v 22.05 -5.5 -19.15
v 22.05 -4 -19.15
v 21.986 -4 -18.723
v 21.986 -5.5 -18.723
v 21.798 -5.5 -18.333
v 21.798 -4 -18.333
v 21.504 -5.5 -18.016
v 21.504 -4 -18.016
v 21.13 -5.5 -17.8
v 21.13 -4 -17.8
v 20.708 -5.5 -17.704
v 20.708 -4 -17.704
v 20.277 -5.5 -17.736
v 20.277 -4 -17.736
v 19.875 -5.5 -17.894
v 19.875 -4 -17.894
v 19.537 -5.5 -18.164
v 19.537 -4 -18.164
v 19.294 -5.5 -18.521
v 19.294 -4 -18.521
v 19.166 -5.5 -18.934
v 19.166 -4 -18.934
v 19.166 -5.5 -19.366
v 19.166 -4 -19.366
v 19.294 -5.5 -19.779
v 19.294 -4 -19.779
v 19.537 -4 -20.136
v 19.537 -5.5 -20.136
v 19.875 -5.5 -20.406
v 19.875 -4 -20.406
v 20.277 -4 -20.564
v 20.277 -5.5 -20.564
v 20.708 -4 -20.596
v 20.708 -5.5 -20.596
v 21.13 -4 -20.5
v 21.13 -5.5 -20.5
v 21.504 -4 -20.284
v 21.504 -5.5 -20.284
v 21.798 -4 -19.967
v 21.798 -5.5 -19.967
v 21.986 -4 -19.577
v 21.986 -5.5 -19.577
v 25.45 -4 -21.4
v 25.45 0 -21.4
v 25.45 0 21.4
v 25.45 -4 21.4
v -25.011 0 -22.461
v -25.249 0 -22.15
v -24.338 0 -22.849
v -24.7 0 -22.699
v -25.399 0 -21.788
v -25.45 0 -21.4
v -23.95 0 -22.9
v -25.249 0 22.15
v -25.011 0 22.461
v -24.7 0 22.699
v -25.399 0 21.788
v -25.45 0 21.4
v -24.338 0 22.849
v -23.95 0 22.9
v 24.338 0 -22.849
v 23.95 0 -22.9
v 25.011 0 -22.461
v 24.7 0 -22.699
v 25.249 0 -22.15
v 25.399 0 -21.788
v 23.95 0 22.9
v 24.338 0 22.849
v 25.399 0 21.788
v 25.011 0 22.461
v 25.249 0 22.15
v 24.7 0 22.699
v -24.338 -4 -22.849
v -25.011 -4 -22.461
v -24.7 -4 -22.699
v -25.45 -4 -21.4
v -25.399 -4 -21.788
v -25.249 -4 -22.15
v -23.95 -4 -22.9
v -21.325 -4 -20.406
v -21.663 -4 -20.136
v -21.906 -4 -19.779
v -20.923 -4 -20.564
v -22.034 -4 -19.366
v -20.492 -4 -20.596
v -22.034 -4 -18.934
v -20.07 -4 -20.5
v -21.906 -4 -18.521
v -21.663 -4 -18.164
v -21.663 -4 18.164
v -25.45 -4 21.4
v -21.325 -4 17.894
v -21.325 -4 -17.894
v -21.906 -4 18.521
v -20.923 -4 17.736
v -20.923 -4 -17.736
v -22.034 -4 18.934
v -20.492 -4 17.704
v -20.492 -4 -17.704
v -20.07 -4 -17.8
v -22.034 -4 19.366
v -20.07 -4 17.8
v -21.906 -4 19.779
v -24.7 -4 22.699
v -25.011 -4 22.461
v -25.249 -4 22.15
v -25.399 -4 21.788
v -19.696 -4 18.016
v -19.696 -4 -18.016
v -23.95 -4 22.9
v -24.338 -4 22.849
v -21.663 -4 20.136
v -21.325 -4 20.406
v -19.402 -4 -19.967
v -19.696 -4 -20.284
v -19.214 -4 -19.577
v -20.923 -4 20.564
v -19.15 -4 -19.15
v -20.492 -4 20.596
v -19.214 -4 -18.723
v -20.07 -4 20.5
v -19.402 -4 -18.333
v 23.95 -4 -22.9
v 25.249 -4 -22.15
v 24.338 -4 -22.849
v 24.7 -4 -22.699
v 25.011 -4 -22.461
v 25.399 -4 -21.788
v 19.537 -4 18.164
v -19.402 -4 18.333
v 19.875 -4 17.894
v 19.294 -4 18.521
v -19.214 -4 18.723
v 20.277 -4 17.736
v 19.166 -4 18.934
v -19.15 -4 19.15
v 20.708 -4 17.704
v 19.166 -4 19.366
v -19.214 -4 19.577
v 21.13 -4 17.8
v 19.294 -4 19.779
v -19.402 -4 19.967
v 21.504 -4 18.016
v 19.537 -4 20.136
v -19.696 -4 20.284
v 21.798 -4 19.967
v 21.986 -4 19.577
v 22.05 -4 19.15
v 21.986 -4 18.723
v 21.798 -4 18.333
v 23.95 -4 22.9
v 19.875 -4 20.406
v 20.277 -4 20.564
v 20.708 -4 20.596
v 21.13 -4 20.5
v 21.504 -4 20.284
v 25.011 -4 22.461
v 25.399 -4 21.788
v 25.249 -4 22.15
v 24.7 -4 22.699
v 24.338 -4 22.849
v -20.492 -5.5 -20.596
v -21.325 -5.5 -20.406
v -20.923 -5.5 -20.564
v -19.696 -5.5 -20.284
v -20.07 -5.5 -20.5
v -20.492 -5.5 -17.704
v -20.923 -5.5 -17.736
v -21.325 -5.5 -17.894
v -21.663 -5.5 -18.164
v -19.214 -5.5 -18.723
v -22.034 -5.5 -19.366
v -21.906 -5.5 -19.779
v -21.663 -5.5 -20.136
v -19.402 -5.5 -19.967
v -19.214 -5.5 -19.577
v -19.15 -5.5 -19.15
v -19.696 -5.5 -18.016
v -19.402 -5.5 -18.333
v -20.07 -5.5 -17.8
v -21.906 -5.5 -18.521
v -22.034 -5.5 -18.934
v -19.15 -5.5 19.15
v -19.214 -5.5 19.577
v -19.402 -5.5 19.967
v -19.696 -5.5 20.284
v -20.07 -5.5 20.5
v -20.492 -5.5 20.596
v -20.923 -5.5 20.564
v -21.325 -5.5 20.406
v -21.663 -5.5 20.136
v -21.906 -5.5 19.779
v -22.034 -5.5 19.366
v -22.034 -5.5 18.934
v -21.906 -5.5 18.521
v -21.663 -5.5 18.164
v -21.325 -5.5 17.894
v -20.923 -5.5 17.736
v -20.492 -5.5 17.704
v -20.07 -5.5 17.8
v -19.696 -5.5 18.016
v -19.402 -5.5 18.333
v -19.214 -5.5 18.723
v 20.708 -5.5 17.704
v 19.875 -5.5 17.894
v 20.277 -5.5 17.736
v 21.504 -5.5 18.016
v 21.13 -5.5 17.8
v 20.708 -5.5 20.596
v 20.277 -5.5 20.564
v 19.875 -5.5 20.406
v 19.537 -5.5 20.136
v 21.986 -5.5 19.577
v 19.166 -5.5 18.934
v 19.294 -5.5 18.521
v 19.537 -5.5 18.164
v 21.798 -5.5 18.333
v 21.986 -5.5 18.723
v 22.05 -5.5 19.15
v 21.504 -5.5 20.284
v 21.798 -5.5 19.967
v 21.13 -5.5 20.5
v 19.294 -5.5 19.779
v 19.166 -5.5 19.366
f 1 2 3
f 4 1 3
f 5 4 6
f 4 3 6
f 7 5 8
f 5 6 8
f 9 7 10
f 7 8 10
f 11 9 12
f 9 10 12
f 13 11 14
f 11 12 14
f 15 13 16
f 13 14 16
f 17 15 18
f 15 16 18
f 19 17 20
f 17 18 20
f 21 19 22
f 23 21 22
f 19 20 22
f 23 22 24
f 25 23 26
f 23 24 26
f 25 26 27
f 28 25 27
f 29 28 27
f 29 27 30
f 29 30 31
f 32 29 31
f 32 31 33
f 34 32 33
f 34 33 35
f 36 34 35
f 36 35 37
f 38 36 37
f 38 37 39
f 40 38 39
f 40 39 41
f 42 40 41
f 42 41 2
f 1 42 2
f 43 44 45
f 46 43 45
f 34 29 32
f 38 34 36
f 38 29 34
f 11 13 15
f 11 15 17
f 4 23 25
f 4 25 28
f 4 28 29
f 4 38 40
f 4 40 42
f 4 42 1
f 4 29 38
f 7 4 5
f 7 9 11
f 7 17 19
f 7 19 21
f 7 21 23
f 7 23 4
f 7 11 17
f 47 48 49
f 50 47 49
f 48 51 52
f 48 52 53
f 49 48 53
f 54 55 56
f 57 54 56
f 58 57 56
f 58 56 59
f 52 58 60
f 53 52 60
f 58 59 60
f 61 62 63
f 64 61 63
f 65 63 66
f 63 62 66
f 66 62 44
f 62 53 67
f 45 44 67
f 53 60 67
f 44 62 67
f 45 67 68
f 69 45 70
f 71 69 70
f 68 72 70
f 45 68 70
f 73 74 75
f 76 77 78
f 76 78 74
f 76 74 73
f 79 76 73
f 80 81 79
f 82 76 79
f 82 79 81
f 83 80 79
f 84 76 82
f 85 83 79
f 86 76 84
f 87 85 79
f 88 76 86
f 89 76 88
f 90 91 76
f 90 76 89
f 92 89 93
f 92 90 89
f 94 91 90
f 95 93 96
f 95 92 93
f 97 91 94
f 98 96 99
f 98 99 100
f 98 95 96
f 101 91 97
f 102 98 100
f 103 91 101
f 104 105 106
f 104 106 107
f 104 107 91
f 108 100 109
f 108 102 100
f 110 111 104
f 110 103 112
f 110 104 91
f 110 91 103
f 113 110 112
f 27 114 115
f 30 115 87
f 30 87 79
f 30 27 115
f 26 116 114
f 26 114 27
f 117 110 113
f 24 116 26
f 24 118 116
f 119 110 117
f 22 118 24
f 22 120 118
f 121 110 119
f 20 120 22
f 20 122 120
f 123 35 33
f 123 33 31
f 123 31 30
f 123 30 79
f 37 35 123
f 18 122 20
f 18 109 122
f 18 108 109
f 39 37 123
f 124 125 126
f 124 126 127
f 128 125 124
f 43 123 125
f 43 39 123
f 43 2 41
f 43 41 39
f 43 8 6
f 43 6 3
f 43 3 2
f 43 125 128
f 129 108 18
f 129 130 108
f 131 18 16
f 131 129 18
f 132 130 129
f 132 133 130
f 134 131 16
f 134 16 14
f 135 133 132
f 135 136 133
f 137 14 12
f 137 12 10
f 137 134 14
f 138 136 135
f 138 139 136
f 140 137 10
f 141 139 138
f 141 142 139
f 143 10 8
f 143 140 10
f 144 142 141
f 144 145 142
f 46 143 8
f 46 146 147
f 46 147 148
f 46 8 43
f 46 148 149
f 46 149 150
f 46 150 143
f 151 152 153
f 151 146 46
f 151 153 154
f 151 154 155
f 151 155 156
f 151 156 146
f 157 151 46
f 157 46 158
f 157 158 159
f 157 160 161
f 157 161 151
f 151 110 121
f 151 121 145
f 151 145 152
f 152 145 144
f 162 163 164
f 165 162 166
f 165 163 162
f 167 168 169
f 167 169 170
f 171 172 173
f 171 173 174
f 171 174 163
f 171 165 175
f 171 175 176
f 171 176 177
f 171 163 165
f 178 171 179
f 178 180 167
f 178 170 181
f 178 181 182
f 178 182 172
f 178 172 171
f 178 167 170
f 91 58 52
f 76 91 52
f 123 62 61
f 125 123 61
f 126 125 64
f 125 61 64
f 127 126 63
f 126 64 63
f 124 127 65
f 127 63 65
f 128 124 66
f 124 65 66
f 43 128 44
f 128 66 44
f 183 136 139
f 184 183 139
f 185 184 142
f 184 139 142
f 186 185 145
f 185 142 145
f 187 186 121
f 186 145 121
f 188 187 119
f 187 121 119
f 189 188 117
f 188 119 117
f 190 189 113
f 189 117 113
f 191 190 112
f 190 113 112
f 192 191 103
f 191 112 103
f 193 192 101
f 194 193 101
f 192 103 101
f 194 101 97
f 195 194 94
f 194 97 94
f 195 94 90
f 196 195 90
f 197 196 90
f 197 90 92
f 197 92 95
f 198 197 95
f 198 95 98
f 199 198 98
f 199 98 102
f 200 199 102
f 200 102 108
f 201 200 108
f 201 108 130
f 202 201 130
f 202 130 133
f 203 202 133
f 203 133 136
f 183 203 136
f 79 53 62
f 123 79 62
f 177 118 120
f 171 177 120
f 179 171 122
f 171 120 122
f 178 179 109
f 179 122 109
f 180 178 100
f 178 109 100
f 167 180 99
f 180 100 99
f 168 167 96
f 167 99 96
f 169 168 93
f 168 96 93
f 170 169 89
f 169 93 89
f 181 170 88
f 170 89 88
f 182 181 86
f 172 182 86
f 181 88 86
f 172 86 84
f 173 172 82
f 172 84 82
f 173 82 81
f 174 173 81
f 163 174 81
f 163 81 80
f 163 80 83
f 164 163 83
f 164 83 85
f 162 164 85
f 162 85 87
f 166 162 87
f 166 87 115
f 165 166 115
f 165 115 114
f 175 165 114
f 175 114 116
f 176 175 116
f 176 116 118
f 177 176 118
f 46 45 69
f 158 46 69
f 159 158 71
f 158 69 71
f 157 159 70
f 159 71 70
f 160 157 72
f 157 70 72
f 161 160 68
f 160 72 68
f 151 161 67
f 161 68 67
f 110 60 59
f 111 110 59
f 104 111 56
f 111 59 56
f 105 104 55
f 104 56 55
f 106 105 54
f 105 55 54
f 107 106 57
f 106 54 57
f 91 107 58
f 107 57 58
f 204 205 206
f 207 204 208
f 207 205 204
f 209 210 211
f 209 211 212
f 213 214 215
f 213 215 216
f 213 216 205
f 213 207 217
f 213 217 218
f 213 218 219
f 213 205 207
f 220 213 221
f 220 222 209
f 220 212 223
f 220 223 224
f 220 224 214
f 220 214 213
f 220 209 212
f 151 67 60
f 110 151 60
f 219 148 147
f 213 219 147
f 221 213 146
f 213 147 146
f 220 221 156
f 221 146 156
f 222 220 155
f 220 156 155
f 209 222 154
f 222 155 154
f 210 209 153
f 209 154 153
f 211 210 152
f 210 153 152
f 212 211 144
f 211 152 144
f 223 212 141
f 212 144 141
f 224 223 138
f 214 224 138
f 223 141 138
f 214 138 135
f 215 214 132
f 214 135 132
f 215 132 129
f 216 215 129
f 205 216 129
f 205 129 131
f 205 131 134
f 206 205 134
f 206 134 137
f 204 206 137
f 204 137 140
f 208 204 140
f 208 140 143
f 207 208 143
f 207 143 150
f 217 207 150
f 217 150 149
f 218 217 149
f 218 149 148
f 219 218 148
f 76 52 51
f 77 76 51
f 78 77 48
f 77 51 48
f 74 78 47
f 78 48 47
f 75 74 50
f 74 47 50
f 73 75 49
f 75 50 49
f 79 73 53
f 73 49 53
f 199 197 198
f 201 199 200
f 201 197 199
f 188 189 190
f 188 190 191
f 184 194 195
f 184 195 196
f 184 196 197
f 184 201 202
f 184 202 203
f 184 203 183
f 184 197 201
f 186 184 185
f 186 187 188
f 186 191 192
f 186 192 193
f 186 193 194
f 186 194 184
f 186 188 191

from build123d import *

# Parameters (mm, degrees)
F0_R     = 1.45
F1_DEPTH = 4
F2_DEPTH = 5.5


with BuildPart() as f1:
    # F0 (on Front) → F1 (new body)
    with BuildSketch(Plane.XZ):
        with BuildLine():
            Line((23.95, 22.9), (-23.95, 22.9))
            ThreePointArc((-23.95, 22.9), (-25.01066, 22.46066), (-25.45, 21.4))
            Line((-25.45, 21.4), (-25.45, -21.4))
            ThreePointArc((-25.45, -21.4), (-25.01066, -22.46066), (-23.95, -22.9))
            Line((-23.95, -22.9), (23.95, -22.9))
            ThreePointArc((23.95, -22.9), (25.01066, -22.46066), (25.45, -21.4))
            Line((25.45, -21.4), (25.45, 21.4))
            ThreePointArc((25.45, 21.4), (25.01066, 22.46066), (23.95, 22.9))
        make_face()
        with Locations((-20.6, -19.15)):
            Circle(F0_R, mode=Mode.SUBTRACT)
        with Locations((20.6, -19.15)):
            Circle(F0_R, mode=Mode.SUBTRACT)
        with Locations((-20.6, 19.15)):
            Circle(F0_R, mode=Mode.SUBTRACT)
        with Locations((20.6, 19.15)):
            Circle(F0_R, mode=Mode.SUBTRACT)
        with Locations((20.6, 19.15)):
            Circle(F0_R)
        with Locations((-20.6, 19.15)):
            Circle(F0_R)
        with Locations((-20.6, -19.15)):
            Circle(F0_R)
        with Locations((20.6, -19.15)):
            Circle(F0_R)
    extrude(amount=F1_DEPTH)

    # F0 (on Front) → F2 (join)
    with BuildSketch(Plane.XZ):
        with Locations((-20.6, -19.15)):
            Circle(F0_R)
        with Locations((-20.6, 19.15)):
            Circle(F0_R)
        with Locations((20.6, 19.15)):
            Circle(F0_R)
        with Locations((20.6, -19.15)):
            Circle(F0_R)
    extrude(amount=F2_DEPTH)


solid = f1.part
